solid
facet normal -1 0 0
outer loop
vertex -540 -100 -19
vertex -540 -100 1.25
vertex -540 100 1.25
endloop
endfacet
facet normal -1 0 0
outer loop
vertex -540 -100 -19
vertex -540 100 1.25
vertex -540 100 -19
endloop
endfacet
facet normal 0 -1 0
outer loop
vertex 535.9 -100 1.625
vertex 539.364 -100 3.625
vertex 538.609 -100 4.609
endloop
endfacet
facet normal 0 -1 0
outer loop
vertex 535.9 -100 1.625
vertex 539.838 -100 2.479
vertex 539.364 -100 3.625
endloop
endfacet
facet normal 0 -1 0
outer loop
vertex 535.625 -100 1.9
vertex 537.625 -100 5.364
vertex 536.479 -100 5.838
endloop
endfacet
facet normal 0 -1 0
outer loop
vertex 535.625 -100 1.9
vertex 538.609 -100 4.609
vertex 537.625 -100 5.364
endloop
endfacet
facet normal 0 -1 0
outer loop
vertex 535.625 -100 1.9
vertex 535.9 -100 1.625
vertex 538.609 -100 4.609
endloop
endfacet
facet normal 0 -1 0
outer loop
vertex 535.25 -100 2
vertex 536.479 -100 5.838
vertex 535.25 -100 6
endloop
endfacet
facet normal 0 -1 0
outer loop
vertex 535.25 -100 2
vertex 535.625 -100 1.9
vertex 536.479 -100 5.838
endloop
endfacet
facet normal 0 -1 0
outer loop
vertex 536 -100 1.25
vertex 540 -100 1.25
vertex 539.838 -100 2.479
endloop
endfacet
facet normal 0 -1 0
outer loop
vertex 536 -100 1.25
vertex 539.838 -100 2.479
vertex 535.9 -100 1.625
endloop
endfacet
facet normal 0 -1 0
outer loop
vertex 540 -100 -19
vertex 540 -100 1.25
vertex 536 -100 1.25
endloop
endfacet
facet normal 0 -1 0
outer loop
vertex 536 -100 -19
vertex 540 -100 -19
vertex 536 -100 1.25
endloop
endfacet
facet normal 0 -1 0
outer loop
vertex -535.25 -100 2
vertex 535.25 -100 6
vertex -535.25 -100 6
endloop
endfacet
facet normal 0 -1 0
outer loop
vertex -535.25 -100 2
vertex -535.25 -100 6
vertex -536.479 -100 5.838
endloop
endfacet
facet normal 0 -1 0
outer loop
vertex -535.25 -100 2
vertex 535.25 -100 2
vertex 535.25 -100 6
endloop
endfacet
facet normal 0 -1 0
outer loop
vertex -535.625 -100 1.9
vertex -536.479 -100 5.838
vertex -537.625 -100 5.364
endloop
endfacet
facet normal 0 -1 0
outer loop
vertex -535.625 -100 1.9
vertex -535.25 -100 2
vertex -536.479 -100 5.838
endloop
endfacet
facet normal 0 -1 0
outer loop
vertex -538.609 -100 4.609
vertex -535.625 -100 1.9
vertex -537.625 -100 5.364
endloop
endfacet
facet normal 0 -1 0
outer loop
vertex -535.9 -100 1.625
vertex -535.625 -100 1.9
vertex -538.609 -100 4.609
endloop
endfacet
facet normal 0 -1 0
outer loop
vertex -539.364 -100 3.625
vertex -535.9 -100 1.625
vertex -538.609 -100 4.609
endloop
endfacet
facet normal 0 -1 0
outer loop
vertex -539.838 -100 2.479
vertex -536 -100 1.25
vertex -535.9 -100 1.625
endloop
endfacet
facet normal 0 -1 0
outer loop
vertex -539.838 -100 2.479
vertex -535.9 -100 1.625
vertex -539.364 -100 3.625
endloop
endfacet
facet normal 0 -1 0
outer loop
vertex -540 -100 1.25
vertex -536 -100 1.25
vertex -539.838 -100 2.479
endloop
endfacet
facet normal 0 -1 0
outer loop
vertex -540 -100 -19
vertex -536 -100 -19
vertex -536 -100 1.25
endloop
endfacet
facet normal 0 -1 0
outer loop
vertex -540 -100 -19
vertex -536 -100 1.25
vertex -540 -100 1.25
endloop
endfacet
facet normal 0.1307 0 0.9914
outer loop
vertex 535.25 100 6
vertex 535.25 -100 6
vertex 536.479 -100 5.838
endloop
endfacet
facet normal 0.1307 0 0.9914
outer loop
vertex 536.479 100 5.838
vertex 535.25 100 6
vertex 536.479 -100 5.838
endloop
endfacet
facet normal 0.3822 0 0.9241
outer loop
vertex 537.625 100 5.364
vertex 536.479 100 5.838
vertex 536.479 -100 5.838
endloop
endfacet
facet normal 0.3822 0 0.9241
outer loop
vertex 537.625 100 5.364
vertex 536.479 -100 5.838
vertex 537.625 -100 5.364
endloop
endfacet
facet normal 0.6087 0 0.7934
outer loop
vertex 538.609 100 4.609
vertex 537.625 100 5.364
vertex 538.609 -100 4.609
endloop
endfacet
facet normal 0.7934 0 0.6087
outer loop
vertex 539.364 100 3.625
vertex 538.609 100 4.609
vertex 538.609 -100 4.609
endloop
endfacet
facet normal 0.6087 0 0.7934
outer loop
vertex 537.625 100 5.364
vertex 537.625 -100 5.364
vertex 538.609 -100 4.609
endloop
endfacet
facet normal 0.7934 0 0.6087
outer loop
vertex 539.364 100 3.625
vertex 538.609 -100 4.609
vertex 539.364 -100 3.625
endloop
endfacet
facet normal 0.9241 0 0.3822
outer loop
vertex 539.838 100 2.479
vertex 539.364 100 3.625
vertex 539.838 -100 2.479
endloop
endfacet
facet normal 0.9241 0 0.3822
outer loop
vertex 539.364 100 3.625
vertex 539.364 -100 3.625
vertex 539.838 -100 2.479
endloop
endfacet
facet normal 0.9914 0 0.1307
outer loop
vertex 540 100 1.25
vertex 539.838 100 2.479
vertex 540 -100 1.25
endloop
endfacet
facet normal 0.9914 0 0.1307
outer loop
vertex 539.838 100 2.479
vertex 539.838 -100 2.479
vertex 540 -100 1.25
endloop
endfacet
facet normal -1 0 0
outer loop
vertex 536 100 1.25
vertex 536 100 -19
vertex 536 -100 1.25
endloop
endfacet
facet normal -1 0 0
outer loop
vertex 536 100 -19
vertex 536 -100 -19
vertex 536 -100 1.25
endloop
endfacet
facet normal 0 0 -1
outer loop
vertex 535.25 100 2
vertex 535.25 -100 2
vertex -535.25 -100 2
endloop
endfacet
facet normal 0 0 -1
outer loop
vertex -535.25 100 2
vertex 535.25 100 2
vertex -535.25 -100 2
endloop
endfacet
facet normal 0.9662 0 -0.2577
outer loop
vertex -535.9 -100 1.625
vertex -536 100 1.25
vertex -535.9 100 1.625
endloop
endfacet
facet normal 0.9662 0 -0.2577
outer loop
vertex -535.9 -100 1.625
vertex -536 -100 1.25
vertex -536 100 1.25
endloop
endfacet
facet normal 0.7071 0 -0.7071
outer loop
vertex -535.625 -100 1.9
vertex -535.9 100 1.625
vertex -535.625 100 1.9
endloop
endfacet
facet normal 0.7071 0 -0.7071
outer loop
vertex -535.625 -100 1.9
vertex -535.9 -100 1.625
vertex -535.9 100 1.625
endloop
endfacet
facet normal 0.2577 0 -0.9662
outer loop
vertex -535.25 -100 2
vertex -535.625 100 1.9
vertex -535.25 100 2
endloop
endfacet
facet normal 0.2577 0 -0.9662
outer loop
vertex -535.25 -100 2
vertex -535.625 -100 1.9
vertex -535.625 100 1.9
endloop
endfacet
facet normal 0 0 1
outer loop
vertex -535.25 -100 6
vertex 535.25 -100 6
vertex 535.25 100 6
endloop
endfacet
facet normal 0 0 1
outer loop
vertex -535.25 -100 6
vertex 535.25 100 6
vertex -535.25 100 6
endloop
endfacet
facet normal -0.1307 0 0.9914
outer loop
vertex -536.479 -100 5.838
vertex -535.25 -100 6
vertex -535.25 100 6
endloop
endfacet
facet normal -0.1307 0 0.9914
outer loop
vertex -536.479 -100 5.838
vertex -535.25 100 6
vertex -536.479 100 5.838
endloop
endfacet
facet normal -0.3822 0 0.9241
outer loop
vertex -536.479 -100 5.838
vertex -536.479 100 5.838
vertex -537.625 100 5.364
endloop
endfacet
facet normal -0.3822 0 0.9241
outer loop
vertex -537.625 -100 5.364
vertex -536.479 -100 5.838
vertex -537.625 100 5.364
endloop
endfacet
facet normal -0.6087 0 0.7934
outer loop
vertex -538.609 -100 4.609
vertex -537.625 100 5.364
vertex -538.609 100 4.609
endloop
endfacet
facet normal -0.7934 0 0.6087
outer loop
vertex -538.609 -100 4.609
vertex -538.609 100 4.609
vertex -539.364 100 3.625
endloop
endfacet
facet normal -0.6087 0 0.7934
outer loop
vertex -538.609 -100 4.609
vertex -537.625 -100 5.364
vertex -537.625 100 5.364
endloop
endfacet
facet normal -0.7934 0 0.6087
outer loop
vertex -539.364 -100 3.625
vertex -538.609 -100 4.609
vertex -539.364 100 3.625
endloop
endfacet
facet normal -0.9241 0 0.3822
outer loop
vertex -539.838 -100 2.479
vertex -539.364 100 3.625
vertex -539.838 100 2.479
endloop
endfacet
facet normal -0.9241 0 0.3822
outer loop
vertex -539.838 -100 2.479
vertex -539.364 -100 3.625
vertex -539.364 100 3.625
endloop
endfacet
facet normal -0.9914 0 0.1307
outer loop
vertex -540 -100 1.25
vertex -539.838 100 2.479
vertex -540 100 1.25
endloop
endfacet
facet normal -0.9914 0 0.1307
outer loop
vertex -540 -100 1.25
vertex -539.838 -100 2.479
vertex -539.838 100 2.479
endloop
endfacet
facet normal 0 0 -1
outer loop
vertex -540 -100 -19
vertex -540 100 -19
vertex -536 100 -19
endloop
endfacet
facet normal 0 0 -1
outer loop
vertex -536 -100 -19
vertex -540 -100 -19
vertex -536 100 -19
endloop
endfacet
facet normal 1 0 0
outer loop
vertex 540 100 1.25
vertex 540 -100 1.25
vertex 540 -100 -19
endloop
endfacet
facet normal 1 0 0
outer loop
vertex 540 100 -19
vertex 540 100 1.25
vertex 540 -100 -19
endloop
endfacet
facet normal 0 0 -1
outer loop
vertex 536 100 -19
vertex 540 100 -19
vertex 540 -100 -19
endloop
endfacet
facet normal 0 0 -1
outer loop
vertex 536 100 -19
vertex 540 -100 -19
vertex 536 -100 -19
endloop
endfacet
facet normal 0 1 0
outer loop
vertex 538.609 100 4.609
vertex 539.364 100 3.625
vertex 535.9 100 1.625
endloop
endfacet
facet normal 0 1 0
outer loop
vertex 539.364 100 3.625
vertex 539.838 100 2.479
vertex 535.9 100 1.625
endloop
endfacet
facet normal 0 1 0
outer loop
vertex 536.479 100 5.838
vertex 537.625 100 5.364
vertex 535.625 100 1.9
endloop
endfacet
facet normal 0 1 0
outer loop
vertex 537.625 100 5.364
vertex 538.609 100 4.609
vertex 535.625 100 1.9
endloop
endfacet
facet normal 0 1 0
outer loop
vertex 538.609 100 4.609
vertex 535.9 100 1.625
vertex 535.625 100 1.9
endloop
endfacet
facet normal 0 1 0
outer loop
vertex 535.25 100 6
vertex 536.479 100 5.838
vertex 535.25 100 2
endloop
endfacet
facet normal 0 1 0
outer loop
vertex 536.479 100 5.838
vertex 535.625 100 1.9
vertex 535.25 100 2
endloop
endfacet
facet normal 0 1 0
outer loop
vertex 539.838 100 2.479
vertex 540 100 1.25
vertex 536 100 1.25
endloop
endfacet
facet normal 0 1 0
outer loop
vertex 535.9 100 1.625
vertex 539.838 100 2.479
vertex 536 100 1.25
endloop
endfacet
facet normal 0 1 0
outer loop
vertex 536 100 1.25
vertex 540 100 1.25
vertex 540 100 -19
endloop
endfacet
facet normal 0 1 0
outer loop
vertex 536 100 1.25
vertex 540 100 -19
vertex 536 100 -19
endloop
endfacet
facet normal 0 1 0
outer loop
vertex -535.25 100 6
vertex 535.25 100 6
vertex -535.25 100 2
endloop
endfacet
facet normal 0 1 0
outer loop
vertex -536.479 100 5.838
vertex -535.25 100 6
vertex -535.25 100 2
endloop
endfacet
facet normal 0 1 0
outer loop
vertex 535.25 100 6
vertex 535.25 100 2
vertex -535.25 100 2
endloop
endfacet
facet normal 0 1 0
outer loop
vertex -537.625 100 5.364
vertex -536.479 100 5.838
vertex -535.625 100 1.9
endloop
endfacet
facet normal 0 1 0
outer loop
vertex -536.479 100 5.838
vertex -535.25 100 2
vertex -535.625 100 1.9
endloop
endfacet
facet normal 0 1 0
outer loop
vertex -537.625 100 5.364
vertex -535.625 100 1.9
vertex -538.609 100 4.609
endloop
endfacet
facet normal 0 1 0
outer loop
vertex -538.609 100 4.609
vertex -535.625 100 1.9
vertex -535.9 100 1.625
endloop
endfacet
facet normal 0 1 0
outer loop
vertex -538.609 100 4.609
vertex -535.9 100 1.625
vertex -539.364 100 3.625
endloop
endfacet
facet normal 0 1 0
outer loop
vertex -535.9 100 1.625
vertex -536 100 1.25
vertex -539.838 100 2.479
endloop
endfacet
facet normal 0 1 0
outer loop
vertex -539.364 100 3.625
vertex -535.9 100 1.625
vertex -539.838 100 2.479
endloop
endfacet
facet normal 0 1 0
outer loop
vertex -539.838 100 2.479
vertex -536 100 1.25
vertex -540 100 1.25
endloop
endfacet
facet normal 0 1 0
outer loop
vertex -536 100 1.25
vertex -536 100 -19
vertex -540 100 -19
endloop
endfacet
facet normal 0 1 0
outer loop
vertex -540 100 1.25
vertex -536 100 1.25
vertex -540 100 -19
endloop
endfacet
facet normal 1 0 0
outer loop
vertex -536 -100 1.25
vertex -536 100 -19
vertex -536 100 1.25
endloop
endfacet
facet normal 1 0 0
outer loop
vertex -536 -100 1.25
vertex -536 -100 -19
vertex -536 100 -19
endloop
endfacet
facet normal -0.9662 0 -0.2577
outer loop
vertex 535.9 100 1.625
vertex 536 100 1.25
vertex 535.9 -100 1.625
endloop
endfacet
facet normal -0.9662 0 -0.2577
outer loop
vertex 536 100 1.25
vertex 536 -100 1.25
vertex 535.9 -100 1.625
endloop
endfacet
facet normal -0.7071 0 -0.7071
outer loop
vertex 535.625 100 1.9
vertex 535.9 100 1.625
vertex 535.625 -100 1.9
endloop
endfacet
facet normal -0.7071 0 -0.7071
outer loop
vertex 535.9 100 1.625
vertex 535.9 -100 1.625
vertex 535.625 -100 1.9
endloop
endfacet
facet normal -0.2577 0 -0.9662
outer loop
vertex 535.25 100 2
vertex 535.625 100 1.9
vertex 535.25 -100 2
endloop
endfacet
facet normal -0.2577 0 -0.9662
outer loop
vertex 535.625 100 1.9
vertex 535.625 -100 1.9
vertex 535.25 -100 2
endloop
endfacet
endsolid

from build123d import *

# Parameters (mm, degrees)
SKETCH_1_W                       = 540
SKETCH_1_H                       = 4
SM_BASE_FLANGE_1_DEPTH           = 100
SM_EDGE_FLANGE_1_STRIP_W         = 17.5
SM_EDGE_FLANGE_1_STRIP_H         = 4
SM_EDGE_FLANGE_1_STRIP_CUT_DEPTH = 100
SM_EDGE_FLANGE_1_DEPTH           = 100


# Sheet-metal steps are written as plain solids
with BuildPart() as part:
    # Sketch 1 → Базовая кромка1 (new body)
    with BuildSketch(Plane(origin=(0, 0, 0), x_dir=(1, 0, 0), z_dir=(0, 1, 0))):
        with Locations((270, -4)):
            Rectangle(SKETCH_1_W, SKETCH_1_H)
    extrude(amount=-SM_BASE_FLANGE_1_DEPTH)

    # Ребро-кромка1 strip (across the edge) → Ребро-кромка1 strip cut (cut)
    with BuildSketch(Plane(origin=(540, 0, 2), x_dir=(-1, 0, 0), z_dir=(0, -1, 0))):
        with Locations((-4, -2)):
            Rectangle(SM_EDGE_FLANGE_1_STRIP_W, SM_EDGE_FLANGE_1_STRIP_H)
    extrude(amount=SM_EDGE_FLANGE_1_STRIP_CUT_DEPTH, mode=Mode.SUBTRACT)

    # Ребро-кромка1 section (across the edge) → Ребро-кромка1 (add)
    with BuildSketch(Plane(origin=(540, 0, 2), x_dir=(-1, 0, 0), z_dir=(0, -1, 0))):
        with BuildLine():
            Line((0, 0.75), (0, 21))
            Line((0, 21), (4, 21))
            Line((4, 21), (4, 0.75))
            ThreePointArc((4, 0.75), (4.219669914, 0.219669914), (4.75, 0))
            Line((4.75, 0), (4.75, -4))
            ThreePointArc((4.75, -4), (1.391242789, -2.608757211), (0, 0.75))
        make_face()
    extrude(amount=SM_EDGE_FLANGE_1_DEPTH)

    # Зеркальное отражение1: part across plane


with BuildPart() as part_1:
    add(part.part)
    add(part.part.mirror(Plane(origin=(0, 0, 0), x_dir=(0, 0, 1), z_dir=(0, -1, 0))))

    # Зеркальное отражение2: part across face


with BuildPart() as part_2:
    add(part_1.part)
    add(part_1.part.mirror(Plane(origin=(0, 0, 4), x_dir=(0, 0, 1), z_dir=(-1, 0, 0))))


solid = part_2.part
